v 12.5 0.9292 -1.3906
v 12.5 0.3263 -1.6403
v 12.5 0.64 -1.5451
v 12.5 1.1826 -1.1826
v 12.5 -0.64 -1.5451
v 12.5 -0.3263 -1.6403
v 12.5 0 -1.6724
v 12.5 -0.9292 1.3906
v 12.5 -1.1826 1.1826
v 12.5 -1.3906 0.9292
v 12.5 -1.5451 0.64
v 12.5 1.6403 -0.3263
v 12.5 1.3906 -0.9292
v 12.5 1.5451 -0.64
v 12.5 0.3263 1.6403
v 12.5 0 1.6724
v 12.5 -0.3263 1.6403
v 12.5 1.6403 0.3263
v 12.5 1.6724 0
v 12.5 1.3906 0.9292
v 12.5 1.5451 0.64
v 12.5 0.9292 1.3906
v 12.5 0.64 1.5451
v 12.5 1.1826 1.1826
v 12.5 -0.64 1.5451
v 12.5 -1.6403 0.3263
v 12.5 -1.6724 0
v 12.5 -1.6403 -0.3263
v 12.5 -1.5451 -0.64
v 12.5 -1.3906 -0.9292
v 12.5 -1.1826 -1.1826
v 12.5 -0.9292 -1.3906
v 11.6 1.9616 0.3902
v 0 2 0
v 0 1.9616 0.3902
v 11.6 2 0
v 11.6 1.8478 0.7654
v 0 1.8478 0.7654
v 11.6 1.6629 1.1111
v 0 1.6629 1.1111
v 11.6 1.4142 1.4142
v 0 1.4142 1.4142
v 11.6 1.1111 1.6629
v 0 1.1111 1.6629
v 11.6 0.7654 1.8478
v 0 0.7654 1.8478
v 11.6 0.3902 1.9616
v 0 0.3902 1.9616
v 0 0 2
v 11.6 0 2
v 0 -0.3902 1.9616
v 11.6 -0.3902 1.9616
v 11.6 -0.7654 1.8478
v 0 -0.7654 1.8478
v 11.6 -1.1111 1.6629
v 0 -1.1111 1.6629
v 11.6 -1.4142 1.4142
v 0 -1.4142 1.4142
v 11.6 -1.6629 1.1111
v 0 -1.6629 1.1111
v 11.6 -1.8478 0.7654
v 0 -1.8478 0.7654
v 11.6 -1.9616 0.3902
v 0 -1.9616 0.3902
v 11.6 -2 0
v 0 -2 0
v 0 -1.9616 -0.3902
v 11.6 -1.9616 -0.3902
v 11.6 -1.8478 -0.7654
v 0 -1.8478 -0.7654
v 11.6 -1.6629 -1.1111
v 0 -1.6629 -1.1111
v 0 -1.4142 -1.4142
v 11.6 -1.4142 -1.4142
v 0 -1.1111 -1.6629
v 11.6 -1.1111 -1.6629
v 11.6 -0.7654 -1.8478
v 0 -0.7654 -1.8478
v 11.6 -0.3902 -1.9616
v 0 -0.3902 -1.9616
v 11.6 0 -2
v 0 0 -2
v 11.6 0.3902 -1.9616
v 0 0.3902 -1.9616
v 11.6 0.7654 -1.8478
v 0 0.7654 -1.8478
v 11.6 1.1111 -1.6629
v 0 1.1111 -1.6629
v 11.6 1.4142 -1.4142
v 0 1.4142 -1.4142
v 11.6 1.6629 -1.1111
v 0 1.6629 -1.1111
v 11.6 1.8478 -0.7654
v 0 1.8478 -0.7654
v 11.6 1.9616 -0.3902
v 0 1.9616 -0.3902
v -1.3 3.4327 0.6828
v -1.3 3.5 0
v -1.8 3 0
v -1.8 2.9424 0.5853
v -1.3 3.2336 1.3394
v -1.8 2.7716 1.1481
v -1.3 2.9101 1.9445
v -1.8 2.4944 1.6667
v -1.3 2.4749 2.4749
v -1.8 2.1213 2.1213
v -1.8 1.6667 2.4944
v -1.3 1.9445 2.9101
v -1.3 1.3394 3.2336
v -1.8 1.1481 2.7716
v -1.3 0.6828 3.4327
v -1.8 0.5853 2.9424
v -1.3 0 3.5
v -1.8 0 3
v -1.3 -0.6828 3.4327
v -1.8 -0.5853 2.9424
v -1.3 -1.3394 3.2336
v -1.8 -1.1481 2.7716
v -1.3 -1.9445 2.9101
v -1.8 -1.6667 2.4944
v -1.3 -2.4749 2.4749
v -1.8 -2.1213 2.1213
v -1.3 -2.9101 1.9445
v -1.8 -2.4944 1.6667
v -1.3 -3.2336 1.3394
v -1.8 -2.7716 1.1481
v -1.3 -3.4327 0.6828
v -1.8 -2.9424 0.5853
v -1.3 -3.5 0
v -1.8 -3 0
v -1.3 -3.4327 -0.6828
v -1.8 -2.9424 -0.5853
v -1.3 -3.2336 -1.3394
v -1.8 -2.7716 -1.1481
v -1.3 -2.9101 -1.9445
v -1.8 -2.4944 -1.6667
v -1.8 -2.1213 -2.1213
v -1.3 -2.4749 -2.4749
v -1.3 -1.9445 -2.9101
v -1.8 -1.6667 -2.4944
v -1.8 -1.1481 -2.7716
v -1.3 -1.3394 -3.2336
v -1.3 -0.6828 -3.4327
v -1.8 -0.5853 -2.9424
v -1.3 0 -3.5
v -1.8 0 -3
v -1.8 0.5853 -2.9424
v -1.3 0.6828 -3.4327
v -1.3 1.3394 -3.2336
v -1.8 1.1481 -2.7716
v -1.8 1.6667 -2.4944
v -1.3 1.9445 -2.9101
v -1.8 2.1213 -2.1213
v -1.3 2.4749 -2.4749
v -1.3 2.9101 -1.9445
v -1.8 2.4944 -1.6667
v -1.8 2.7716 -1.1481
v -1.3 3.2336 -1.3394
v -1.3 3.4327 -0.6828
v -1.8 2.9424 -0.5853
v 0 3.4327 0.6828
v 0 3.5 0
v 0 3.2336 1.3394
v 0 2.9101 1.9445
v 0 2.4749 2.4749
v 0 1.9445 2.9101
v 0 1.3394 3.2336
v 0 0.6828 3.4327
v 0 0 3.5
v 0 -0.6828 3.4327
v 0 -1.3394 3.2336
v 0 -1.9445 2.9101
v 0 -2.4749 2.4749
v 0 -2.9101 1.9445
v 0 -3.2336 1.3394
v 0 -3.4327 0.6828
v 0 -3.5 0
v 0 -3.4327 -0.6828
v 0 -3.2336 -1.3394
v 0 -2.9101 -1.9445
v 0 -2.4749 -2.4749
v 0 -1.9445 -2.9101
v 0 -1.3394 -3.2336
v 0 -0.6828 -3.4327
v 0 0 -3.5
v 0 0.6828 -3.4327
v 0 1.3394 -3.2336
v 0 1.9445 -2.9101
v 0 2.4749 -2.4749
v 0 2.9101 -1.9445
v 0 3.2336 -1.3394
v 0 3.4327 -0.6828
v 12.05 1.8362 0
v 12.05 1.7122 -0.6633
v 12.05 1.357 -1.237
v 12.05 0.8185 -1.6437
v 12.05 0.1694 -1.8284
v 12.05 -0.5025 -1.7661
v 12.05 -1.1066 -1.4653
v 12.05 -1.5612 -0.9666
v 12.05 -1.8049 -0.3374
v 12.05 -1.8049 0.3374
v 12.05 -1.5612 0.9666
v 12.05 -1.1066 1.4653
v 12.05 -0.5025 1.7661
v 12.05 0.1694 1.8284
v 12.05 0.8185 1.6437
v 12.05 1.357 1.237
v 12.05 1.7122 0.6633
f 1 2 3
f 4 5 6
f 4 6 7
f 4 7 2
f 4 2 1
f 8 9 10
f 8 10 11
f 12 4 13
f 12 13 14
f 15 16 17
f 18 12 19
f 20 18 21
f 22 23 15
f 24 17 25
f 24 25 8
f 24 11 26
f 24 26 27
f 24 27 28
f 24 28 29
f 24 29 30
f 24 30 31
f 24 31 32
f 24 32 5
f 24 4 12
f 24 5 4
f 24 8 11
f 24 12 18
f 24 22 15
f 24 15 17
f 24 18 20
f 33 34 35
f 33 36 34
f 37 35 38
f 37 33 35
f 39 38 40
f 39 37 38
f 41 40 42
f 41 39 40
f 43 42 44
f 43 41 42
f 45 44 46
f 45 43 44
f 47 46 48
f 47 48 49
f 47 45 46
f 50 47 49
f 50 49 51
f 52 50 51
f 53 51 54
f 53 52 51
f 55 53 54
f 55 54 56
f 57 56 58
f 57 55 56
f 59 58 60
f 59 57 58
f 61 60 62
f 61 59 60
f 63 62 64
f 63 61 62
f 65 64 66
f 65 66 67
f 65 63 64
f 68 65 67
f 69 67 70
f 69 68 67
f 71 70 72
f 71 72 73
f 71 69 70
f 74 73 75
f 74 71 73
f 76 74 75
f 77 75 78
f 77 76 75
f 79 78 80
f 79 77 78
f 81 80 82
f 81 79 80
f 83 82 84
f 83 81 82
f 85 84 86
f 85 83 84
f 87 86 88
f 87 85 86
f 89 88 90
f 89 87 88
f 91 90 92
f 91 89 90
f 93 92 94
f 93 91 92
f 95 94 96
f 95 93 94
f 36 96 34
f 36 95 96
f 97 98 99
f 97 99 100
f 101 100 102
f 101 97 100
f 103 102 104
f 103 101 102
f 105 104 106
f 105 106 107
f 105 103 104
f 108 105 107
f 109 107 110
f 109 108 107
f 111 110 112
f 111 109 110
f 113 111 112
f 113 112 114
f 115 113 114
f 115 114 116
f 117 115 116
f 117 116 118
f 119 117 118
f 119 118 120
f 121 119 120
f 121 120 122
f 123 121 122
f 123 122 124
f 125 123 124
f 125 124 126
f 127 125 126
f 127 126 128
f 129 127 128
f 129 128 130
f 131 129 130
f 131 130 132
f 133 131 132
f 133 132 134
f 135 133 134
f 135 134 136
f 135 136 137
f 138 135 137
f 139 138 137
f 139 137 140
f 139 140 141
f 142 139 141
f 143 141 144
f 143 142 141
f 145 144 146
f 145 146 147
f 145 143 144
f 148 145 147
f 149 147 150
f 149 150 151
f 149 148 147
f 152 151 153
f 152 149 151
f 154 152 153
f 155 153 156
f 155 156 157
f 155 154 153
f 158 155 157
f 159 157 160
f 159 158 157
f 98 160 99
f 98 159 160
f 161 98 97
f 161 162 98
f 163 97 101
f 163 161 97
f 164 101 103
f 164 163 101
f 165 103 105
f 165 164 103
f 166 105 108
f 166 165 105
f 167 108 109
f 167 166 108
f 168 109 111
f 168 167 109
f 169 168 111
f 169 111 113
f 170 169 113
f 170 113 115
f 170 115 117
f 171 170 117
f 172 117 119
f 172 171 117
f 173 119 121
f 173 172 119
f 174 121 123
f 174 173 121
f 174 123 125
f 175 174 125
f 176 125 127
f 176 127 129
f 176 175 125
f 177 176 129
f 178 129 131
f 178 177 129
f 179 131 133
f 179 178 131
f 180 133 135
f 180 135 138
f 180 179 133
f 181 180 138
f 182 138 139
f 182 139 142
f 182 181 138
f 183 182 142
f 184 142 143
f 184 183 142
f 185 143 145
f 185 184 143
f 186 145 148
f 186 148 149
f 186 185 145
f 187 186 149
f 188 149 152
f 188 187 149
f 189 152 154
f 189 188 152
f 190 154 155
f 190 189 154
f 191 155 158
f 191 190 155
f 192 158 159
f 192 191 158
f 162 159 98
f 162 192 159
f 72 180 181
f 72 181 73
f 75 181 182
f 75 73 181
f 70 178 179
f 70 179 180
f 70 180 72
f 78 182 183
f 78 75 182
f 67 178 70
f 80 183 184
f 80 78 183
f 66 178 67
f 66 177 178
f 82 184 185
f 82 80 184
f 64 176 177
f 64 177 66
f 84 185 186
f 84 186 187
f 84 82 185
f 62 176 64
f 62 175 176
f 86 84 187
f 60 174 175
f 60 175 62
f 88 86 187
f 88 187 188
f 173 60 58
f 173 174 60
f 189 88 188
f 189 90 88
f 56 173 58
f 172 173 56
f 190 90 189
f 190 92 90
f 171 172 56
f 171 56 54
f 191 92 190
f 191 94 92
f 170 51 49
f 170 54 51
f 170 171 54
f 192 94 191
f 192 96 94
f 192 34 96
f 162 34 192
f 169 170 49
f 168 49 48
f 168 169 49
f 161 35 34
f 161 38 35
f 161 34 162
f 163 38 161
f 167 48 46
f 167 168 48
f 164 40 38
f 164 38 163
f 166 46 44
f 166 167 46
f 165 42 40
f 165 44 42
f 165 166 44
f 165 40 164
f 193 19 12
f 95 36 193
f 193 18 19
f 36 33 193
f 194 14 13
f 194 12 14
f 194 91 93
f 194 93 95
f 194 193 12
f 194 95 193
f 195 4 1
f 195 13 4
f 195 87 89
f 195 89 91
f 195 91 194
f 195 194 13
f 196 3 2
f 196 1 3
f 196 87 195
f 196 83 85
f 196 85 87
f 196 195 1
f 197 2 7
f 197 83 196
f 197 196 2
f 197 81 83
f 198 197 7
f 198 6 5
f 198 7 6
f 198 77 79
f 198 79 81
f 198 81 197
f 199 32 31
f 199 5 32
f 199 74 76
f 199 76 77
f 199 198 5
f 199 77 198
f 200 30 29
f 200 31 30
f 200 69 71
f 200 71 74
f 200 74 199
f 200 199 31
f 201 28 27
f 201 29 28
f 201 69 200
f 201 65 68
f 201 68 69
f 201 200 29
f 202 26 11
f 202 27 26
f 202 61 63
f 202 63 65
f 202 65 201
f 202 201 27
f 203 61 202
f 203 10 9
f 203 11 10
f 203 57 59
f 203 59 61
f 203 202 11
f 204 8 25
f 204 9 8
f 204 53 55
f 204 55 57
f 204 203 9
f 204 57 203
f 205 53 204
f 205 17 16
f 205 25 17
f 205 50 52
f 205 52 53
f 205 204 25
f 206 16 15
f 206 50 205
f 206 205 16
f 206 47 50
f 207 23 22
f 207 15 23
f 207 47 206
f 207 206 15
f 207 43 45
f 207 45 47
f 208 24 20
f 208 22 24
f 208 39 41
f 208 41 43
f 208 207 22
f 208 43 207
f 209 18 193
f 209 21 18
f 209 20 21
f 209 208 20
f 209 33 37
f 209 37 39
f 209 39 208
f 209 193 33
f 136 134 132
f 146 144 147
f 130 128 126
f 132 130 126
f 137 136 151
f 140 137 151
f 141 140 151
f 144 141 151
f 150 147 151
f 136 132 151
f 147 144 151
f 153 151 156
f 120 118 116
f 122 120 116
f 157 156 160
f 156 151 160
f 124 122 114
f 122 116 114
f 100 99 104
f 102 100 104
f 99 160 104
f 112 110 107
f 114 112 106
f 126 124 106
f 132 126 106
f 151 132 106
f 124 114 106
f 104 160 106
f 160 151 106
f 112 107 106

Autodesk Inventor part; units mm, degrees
ref_plane "YZ Plane" through (0, 0, 0) normal (1, 0, 0) x (0, 1, 0)
ref_plane "XZ Plane" through (0, 0, 0) normal (0, 1, 0) x (-1, 0, 0)
sketch "Sketch1" plane through (0, 0, 0) normal (0, 0, 1) x (1, 0, 0)
  line L0 (-1.8, 0) -> (-1.8, 3.5)
  line L1 (-1.8, 3.5) -> (0, 3.5)
  line L2 (0, 3.5) -> (0, 2)
  line L3 (0, 2) -> (12.5, 2)
  line L4 (12.5, 2) -> (12.5, 0)
  line L5 (-1.8, 0) -> (12.5, 0)
  line L6 (-4.7305, 0) -> (15.7829, 0) projected
  line L7 (0, -1.84) -> (0, 4.39) projected
  circle A0 centre (10.25, 0) radius 0.95
  dimension "d0" = 4
  dimension "d1" = 7
  dimension "d2" = 1.8
  dimension "d3" = 12.5
  dimension "d5" = 2.25
  dimension "d6" = 1.9
revolve "Body" add sketch "Sketch1" angle 360 about axis through (-1.8, 0, 0) along (1, 0, 0) picked at (10.3623, 0.2961) contours L0 L1 L2 L7 L5 | L7 L3 L4 L5 A0 | A0 L5
extrude "Hole" [suppressed]
chamfer "Chamfer1" distance 0.5 angle 45 1 edges at (-1.8, -3.5, 0) measured on face at (-1.2, 3.4547, -0.5614)
chamfer "Chamfer2" distance 0.9 angle 20 1 edges at (12.5, -2, 0) measured on face at (4.1667, 1.9935, -0.1609)
ref_plane "Work Plane1" through (6.25, 0, 2) normal (0, 0, 1) x (1, 0, 0)
equation "\"d0\" = NND"
equation "\"d1\" = KOD"
equation "\"d2\" = KOH"
equation "\"d3\" = NLG"
equation "\"d5\" = DIST"
equation "\"d6\" = BOR"
equation "\"d7\" = NND"
equation "\"d9\" = PHH2"
equation "\"d10\" = FAWI2"
equation "\"d16\" = PHH2"
equation "\"d11\" = PHH1"
equation "\"d12\" = FAWI1"
equation "\"d17\" = PHH1"
equation "\"PHH1\" = 0.9"
equation "\"PHH2\" = 0.5"
equation "\"KOD\" = 7"
equation "\"KOH\" = 1.8"
equation "\"NND\" = 4"
equation "\"FAWI1\" = 20deg"
equation "\"FAWI2\" = 45deg"
equation "\"DIST\" = 2.25"
equation "\"BOR\" = 1.9"
equation "\"NLG\" = 12.5"
properties part number "DS51F1496-07" material "Steel, Mild"
